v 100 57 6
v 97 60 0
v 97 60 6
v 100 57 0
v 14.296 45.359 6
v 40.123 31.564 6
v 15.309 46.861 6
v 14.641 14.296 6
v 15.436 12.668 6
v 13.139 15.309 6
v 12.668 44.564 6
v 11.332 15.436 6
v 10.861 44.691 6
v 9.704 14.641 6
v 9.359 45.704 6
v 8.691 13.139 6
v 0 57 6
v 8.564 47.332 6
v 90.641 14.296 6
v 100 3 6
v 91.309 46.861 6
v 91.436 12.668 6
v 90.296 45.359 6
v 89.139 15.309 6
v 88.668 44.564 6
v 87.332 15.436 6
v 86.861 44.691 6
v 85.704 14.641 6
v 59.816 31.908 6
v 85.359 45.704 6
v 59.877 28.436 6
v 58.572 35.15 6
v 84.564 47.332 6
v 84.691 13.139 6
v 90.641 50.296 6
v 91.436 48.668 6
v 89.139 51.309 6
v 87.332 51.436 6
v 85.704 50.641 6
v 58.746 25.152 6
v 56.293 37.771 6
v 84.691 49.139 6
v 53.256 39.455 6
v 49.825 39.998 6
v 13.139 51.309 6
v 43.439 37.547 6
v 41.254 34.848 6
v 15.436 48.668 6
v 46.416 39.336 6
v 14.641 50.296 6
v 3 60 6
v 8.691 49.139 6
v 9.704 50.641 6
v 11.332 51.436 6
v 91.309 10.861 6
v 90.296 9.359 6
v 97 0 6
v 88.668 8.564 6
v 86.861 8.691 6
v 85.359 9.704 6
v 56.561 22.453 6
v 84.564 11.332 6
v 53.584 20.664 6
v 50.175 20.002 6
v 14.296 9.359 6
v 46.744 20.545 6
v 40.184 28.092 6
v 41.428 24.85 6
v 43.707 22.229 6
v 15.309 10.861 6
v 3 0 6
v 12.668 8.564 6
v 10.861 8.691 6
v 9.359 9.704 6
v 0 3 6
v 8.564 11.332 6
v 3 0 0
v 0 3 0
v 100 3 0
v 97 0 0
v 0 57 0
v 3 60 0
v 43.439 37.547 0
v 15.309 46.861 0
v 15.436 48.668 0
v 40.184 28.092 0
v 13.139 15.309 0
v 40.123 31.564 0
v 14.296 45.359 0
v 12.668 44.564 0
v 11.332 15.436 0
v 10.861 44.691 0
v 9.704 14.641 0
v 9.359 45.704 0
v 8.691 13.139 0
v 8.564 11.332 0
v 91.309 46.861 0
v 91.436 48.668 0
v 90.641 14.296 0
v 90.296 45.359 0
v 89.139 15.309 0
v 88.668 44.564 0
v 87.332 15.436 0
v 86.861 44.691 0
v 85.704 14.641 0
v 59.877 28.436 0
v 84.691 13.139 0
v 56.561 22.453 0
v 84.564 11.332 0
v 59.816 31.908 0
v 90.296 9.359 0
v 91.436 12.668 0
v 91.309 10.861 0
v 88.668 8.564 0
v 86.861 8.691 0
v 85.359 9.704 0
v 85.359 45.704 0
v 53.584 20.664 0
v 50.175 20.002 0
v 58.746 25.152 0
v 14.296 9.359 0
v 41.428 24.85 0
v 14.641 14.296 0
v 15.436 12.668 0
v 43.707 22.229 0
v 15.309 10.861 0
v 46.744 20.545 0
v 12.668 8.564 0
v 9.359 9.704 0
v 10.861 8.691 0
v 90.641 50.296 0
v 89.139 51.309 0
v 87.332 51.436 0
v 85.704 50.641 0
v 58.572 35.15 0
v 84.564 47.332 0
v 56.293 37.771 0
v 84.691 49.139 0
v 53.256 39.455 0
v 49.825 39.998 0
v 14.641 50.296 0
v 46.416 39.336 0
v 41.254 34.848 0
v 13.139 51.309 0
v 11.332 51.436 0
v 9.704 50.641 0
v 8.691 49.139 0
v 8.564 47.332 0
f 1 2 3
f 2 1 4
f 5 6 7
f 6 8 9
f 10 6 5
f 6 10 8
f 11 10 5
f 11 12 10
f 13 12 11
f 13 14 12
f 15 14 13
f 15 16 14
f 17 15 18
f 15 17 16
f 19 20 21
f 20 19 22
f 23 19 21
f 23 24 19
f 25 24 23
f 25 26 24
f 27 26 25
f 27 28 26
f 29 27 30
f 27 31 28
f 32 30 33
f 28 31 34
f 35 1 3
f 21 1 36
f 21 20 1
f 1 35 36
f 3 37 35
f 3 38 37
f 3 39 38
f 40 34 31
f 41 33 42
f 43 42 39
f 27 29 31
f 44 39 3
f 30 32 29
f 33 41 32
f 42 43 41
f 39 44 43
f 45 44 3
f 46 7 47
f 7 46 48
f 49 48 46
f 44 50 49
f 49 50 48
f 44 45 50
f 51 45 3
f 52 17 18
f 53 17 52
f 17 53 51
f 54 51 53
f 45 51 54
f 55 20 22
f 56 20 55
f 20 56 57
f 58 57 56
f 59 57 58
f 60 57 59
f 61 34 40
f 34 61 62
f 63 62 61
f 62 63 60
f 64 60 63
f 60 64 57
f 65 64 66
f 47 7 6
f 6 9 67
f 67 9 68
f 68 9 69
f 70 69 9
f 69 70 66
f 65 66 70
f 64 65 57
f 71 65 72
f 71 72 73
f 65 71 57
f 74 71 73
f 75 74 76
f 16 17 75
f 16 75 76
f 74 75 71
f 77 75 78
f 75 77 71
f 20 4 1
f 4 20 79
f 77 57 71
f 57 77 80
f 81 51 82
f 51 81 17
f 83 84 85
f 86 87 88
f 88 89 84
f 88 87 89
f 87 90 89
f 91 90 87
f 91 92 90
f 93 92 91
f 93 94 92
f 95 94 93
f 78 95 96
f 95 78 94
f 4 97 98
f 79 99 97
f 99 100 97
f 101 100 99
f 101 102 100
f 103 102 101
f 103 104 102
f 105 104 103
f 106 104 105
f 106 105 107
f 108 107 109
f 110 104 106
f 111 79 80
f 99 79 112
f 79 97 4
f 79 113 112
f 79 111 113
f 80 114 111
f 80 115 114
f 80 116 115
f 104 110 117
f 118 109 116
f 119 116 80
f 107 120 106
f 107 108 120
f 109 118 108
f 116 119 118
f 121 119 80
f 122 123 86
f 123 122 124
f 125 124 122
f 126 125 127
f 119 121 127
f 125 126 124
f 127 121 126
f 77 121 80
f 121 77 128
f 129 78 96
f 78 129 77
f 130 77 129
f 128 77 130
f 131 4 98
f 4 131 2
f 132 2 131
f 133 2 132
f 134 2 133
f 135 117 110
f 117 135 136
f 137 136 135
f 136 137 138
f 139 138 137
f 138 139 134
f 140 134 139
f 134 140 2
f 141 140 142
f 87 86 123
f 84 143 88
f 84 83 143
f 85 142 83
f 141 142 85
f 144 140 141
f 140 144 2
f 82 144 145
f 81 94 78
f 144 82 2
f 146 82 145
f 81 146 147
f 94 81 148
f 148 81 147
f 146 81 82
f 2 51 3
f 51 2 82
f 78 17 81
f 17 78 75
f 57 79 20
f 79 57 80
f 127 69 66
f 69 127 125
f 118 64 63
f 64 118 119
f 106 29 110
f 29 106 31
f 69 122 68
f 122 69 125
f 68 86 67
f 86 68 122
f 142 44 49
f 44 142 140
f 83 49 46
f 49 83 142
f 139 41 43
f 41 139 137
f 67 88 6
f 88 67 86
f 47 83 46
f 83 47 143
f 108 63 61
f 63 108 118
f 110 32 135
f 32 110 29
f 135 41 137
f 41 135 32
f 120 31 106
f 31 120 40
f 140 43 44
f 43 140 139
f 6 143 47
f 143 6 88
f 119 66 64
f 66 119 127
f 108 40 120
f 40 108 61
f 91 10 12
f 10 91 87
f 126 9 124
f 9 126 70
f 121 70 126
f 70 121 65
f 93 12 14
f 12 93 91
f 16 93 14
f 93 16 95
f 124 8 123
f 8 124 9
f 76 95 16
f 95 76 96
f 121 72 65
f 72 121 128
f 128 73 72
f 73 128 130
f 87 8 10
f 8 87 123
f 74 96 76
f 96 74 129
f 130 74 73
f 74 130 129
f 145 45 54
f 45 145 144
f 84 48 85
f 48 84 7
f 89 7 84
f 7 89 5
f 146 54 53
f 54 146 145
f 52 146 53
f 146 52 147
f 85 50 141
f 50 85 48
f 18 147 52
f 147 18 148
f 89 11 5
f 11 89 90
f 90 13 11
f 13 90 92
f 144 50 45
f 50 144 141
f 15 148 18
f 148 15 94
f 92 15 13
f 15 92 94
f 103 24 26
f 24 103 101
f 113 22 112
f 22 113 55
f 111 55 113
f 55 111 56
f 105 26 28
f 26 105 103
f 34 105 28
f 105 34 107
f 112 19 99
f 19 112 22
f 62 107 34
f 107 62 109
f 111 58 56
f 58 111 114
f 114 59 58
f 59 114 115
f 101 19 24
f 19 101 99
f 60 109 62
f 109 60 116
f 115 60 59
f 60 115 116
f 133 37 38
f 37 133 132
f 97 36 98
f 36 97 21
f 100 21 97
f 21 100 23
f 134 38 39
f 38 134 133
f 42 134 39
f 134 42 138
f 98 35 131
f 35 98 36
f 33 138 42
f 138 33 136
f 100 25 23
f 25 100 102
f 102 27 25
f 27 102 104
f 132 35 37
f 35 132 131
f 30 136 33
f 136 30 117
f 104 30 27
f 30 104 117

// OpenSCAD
$fn = 32;

// ----------------------------------------------------------------------
// Spacer plate: rect 100 x 60
// ----------------------------------------------------------------------

// --- parameters (mm) ---
bore_r = 10;              // centre bore radius
bolt_r = 3.5;             // bolt hole radius
plate_t = 6;              // plate thickness, Z (extrusion height)
plate_l = 100;            // plate length, X
plate_w = 60;             // plate width, Y
inset = 12;               // corner hole inset

profile = [[3, 0], [97, 0], [100, 3], [100, 57], [97, 60], [3, 60], [0, 57], [0, 3]];  // primary outline, 8 points, counter clockwise
void_1 = [[59.816, 31.908], [58.572, 35.15], [56.293, 37.771], [53.256, 39.455], [49.825, 39.998], [46.416, 39.336], [43.439, 37.547], [41.254, 34.848], [40.123, 31.564], [40.184, 28.092], [41.428, 24.85], [43.707, 22.229], [46.744, 20.545], [50.175, 20.002], [53.584, 20.664], [56.561, 22.453], [58.746, 25.152], [59.877, 28.436]];  // centre bore, 18 points
void_2 = [[15.436, 12.668], [14.641, 14.296], [13.139, 15.309], [11.332, 15.436], [9.704, 14.641], [8.691, 13.139], [8.564, 11.332], [9.359, 9.704], [10.861, 8.691], [12.668, 8.564], [14.296, 9.359], [15.309, 10.861]];  // corner hole, 12 points
void_3 = [[15.436, 48.668], [14.641, 50.296], [13.139, 51.309], [11.332, 51.436], [9.704, 50.641], [8.691, 49.139], [8.564, 47.332], [9.359, 45.704], [10.861, 44.691], [12.668, 44.564], [14.296, 45.359], [15.309, 46.861]];  // corner hole, 12 points
void_4 = [[91.436, 12.668], [90.641, 14.296], [89.139, 15.309], [87.332, 15.436], [85.704, 14.641], [84.691, 13.139], [84.564, 11.332], [85.359, 9.704], [86.861, 8.691], [88.668, 8.564], [90.296, 9.359], [91.309, 10.861]];  // corner hole, 12 points
void_5 = [[91.436, 48.668], [90.641, 50.296], [89.139, 51.309], [87.332, 51.436], [85.704, 50.641], [84.691, 49.139], [84.564, 47.332], [85.359, 45.704], [86.861, 44.691], [88.668, 44.564], [90.296, 45.359], [91.309, 46.861]];  // corner hole, 12 points

// --- the one profile operation ---
difference() {
  linear_extrude(height = plate_t) polygon(points = profile);
  translate([0, 0, -1])
    linear_extrude(height = plate_t + 2) polygon(points = void_1);
  translate([0, 0, -1])
    linear_extrude(height = plate_t + 2) polygon(points = void_2);
  translate([0, 0, -1])
    linear_extrude(height = plate_t + 2) polygon(points = void_3);
  translate([0, 0, -1])
    linear_extrude(height = plate_t + 2) polygon(points = void_4);
  translate([0, 0, -1])
    linear_extrude(height = plate_t + 2) polygon(points = void_5);
}
